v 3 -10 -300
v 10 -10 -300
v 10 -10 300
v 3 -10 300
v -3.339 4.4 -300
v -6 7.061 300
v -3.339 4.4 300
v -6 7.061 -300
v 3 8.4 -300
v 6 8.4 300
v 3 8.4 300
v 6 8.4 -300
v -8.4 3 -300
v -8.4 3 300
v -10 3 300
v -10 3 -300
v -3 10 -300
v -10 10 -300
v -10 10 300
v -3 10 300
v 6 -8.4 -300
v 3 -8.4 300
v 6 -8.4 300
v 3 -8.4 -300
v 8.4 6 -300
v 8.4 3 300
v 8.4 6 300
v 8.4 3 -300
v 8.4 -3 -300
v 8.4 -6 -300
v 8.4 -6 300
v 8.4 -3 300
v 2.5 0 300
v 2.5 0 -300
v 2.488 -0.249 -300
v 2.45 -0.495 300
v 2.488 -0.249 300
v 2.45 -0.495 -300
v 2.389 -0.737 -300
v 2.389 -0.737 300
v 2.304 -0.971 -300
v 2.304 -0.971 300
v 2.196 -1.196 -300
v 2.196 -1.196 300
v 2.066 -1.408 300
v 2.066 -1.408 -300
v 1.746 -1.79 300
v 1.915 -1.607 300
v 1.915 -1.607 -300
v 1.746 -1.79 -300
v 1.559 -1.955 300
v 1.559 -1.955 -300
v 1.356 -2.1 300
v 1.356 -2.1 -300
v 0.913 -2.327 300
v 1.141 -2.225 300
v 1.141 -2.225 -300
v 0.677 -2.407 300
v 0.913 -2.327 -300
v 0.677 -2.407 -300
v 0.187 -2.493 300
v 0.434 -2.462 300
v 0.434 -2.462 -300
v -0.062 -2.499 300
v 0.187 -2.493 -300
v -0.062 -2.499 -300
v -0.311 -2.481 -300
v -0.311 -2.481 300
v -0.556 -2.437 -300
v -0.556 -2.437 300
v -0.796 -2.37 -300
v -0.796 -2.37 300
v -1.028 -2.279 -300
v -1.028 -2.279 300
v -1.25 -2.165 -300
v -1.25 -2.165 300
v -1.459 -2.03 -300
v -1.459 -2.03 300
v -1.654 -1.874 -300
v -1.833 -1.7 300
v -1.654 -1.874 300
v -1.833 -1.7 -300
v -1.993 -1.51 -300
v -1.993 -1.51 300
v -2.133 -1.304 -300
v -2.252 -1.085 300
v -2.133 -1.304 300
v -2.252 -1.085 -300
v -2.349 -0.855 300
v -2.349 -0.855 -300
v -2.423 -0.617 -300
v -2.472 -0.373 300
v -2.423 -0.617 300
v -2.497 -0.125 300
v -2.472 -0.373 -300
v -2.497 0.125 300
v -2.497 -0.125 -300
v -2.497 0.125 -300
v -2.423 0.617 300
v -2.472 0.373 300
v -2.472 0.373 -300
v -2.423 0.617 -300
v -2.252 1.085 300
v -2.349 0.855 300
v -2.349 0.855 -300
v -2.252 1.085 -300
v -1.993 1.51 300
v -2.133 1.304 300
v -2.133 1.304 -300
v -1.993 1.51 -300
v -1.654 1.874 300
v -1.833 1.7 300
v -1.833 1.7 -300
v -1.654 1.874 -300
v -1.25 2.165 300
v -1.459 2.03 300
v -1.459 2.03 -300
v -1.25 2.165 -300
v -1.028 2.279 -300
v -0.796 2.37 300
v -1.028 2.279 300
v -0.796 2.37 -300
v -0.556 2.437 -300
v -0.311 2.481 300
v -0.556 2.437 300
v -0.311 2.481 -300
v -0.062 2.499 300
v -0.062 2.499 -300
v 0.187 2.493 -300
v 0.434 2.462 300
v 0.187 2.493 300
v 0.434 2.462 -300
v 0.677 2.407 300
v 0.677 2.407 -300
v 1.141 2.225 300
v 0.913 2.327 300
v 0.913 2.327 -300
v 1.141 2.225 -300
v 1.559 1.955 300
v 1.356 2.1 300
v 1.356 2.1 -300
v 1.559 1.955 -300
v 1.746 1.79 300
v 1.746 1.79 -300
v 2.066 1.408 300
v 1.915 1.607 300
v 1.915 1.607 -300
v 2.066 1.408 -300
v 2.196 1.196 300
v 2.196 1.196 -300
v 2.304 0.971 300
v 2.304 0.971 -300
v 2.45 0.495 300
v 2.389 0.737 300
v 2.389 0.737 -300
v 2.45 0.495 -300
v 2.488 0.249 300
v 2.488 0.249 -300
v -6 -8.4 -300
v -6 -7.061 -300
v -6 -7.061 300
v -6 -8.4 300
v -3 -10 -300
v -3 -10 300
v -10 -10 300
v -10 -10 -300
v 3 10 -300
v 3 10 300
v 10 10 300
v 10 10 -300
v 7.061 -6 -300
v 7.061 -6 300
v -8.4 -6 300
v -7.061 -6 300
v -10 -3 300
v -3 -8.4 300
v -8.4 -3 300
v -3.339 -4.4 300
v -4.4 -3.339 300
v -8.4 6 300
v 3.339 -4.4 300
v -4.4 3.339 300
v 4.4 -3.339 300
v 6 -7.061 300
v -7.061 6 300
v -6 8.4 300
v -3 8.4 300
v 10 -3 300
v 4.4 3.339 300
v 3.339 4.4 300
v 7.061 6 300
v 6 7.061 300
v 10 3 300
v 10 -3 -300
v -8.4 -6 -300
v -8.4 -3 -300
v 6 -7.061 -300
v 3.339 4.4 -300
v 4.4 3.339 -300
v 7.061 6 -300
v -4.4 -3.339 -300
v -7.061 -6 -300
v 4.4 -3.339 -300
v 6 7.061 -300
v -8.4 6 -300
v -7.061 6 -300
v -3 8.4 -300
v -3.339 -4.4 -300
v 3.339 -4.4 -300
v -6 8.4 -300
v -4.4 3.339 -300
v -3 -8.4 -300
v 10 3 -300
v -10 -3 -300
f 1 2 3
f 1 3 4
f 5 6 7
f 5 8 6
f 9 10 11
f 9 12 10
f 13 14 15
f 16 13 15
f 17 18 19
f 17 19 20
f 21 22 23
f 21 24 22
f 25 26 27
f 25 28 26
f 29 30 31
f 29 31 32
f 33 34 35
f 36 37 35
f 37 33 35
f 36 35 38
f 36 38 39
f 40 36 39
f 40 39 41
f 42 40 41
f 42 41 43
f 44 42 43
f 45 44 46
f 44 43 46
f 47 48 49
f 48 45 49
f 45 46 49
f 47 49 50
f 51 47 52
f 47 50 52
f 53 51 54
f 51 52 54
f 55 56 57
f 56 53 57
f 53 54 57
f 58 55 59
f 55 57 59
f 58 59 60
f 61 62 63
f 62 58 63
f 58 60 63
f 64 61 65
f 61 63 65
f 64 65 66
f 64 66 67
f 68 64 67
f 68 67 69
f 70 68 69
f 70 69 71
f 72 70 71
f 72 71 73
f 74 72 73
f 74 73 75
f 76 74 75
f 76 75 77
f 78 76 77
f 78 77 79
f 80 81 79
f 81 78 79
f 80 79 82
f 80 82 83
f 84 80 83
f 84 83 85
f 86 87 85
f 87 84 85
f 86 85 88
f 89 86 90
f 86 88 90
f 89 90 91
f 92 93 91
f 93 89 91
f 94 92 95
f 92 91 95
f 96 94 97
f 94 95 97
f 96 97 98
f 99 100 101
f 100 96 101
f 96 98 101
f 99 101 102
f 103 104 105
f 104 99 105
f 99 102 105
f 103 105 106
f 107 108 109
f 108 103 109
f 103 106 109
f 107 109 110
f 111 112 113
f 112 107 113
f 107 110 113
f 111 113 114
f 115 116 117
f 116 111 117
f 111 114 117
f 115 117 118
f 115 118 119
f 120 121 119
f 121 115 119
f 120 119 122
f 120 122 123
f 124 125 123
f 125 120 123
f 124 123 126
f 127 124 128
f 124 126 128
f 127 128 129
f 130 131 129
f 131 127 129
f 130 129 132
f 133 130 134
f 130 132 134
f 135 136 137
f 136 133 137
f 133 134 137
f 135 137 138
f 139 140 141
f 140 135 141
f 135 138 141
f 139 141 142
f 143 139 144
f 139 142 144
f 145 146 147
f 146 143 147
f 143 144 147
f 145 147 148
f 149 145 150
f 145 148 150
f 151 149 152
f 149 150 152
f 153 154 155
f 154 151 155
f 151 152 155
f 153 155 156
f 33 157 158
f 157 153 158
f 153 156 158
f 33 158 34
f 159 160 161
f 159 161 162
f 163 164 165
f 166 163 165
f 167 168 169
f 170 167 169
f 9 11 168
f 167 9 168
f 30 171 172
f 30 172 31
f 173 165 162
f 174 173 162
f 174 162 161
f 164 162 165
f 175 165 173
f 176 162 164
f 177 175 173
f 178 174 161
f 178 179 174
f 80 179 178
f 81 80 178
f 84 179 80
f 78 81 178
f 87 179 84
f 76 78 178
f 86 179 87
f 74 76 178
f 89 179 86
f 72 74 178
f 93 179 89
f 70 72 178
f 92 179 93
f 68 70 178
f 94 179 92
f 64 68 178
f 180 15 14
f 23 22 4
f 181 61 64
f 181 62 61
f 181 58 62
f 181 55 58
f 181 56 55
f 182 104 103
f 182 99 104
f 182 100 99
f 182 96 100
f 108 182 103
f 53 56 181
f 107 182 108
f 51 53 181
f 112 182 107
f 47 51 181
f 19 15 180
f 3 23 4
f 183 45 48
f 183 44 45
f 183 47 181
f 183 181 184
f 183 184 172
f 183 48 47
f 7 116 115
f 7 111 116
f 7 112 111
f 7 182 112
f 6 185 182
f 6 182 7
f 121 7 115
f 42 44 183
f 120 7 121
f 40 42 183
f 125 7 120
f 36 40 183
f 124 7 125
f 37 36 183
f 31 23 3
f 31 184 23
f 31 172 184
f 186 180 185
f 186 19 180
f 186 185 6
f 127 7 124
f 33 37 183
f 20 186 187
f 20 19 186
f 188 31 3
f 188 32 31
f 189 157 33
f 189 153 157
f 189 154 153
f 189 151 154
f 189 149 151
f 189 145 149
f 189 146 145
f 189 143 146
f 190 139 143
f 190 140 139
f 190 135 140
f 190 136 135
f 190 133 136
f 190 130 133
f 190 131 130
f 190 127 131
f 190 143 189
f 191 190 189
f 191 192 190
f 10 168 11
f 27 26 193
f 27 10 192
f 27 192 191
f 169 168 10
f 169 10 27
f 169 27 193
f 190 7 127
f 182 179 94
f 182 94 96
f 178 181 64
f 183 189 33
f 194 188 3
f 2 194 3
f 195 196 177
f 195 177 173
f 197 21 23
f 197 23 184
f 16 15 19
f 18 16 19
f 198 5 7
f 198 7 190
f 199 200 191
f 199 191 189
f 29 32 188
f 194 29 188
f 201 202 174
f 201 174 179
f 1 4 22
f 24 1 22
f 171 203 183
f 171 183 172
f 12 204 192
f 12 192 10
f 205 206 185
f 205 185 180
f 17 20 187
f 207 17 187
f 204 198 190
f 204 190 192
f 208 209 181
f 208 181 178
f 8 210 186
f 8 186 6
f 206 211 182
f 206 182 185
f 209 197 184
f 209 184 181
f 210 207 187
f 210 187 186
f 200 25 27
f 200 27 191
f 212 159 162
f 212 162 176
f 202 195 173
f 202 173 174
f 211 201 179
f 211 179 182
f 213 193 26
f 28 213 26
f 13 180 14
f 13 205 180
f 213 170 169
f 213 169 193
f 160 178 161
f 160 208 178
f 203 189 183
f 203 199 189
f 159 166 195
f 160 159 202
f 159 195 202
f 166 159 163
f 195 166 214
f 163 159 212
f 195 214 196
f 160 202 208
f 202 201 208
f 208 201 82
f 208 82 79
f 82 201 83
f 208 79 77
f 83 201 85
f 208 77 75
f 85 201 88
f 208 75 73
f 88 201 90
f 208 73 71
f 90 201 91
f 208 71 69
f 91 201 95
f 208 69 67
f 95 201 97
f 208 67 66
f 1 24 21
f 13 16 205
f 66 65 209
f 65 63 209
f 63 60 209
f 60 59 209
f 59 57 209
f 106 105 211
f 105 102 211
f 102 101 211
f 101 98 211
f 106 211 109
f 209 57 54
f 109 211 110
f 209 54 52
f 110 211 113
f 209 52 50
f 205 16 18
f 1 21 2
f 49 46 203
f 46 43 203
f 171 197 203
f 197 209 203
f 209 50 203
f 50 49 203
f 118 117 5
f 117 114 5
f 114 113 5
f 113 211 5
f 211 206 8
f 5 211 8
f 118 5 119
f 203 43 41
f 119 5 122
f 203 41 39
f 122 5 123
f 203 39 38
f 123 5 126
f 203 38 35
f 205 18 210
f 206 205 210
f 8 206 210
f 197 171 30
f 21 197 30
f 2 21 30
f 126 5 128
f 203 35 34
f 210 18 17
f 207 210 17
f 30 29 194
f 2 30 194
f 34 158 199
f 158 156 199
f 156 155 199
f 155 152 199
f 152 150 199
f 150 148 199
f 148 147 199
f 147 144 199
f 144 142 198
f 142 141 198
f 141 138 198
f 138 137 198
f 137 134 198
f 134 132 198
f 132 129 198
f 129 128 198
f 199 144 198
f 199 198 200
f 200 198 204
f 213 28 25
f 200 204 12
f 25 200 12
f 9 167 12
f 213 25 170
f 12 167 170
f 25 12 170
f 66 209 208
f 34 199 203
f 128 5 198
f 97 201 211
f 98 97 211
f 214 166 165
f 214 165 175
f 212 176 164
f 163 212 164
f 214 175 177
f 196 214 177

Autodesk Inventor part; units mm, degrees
sketch "スケッチ1" plane through (0, 0, 0) normal (0, 0, 1) x (1, 0, 0)
  circle A0 centre (0, 0) radius 2.5
  line L0 (-10, 10) -> (10, 10) construction
  line L1 (10, 10) -> (10, -10) construction
  line L2 (10, -10) -> (-10, -10) construction
  line L3 (-10, -10) -> (-10, 10) construction
  line L4 (-3, 10) -> (-3, 8.4) construction
  line L5 (-3, 8.4) -> (-6, 8.4) construction
  line L6 (-6, 8.4) -> (-6, 7.0607) construction
  line L7 (-6, 7.0607) -> (-3.3393, 4.4) construction
  line L8 (-3.3393, 4.4) -> (3.3393, 4.4) construction
  line L9 (3.3393, 4.4) -> (6, 7.0607) construction
  line L10 (6, 7.0607) -> (6, 8.4) construction
  line L11 (6, 8.4) -> (3, 8.4) construction
  line L12 (3, 8.4) -> (3, 10) construction
  line L13 (-10, 10) -> (10, -10) construction
  line L14 (-10, 10) -> (-3, 10)
  line L15 (-3, 10) -> (-3, 8.4)
  line L16 (-3, 8.4) -> (-6, 8.4)
  line L17 (-6, 8.4) -> (-6, 7.0607)
  line L18 (-6, 7.0607) -> (-3.3393, 4.4)
  line L19 (-3.3393, 4.4) -> (3.3393, 4.4)
  line L20 (3.3393, 4.4) -> (6, 7.0607)
  line L21 (6, 7.0607) -> (6, 8.4)
  line L22 (6, 8.4) -> (3, 8.4)
  line L23 (3, 8.4) -> (3, 10)
  line L24 (3, 10) -> (10, 10)
  line L25 (-10, -10) -> (-10, -3)
  line L26 (-10, -3) -> (-8.4, -3)
  line L27 (-8.4, -3) -> (-8.4, -6)
  line L28 (-8.4, -6) -> (-7.0607, -6)
  line L29 (-7.0607, -6) -> (-4.4, -3.3393)
  line L30 (-4.4, -3.3393) -> (-4.4, 3.3393)
  line L31 (-4.4, 3.3393) -> (-7.0607, 6)
  line L32 (-8.4, 6) -> (-8.4, 3)
  line L33 (-7.0607, 6) -> (-8.4, 6)
  line L34 (-8.4, 3) -> (-10, 3)
  line L35 (-10, 3) -> (-10, 10)
  line L36 (10, -10) -> (3, -10)
  line L37 (3, -10) -> (3, -8.4)
  line L38 (3, -8.4) -> (6, -8.4)
  line L39 (6, -8.4) -> (6, -7.0607)
  line L40 (6, -7.0607) -> (3.3393, -4.4)
  line L41 (3.3393, -4.4) -> (-3.3393, -4.4)
  line L42 (-3.3393, -4.4) -> (-6, -7.0607)
  line L43 (-6, -8.4) -> (-3, -8.4)
  line L44 (-6, -7.0607) -> (-6, -8.4)
  line L45 (-3, -8.4) -> (-3, -10)
  line L46 (-3, -10) -> (-10, -10)
  line L47 (10, 10) -> (10, 3)
  line L48 (10, 3) -> (8.4, 3)
  line L49 (8.4, 3) -> (8.4, 6)
  line L50 (8.4, 6) -> (7.0607, 6)
  line L51 (7.0607, 6) -> (4.4, 3.3393)
  line L52 (4.4, 3.3393) -> (4.4, -3.3393)
  line L53 (4.4, -3.3393) -> (7.0607, -6)
  line L54 (8.4, -6) -> (8.4, -3)
  line L55 (7.0607, -6) -> (8.4, -6)
  line L56 (8.4, -3) -> (10, -3)
  line L57 (10, -3) -> (10, -10)
  point P0 (-10, 0)
  point P1 (0, 10)
  dimension "d0" = 20
  dimension "d1" = 20
  dimension "d2" = 6
  dimension "d3" = 3
  dimension "d4" = 1.6
  dimension "d5" = 4
  dimension "d6" = 12
  dimension "d7" = 6
  dimension "d8" = 135
  dimension "d9" = 135
  dimension "d10" = 0.75
  dimension "d11" = 5
  dimension "d14" = 360
extrude "押し出し1" add sketch "スケッチ1" along normal mid plane 600
equation "\"d7\" = 0.5 * d6"
equation "\"d9\" = d8"
properties part number "l600"
